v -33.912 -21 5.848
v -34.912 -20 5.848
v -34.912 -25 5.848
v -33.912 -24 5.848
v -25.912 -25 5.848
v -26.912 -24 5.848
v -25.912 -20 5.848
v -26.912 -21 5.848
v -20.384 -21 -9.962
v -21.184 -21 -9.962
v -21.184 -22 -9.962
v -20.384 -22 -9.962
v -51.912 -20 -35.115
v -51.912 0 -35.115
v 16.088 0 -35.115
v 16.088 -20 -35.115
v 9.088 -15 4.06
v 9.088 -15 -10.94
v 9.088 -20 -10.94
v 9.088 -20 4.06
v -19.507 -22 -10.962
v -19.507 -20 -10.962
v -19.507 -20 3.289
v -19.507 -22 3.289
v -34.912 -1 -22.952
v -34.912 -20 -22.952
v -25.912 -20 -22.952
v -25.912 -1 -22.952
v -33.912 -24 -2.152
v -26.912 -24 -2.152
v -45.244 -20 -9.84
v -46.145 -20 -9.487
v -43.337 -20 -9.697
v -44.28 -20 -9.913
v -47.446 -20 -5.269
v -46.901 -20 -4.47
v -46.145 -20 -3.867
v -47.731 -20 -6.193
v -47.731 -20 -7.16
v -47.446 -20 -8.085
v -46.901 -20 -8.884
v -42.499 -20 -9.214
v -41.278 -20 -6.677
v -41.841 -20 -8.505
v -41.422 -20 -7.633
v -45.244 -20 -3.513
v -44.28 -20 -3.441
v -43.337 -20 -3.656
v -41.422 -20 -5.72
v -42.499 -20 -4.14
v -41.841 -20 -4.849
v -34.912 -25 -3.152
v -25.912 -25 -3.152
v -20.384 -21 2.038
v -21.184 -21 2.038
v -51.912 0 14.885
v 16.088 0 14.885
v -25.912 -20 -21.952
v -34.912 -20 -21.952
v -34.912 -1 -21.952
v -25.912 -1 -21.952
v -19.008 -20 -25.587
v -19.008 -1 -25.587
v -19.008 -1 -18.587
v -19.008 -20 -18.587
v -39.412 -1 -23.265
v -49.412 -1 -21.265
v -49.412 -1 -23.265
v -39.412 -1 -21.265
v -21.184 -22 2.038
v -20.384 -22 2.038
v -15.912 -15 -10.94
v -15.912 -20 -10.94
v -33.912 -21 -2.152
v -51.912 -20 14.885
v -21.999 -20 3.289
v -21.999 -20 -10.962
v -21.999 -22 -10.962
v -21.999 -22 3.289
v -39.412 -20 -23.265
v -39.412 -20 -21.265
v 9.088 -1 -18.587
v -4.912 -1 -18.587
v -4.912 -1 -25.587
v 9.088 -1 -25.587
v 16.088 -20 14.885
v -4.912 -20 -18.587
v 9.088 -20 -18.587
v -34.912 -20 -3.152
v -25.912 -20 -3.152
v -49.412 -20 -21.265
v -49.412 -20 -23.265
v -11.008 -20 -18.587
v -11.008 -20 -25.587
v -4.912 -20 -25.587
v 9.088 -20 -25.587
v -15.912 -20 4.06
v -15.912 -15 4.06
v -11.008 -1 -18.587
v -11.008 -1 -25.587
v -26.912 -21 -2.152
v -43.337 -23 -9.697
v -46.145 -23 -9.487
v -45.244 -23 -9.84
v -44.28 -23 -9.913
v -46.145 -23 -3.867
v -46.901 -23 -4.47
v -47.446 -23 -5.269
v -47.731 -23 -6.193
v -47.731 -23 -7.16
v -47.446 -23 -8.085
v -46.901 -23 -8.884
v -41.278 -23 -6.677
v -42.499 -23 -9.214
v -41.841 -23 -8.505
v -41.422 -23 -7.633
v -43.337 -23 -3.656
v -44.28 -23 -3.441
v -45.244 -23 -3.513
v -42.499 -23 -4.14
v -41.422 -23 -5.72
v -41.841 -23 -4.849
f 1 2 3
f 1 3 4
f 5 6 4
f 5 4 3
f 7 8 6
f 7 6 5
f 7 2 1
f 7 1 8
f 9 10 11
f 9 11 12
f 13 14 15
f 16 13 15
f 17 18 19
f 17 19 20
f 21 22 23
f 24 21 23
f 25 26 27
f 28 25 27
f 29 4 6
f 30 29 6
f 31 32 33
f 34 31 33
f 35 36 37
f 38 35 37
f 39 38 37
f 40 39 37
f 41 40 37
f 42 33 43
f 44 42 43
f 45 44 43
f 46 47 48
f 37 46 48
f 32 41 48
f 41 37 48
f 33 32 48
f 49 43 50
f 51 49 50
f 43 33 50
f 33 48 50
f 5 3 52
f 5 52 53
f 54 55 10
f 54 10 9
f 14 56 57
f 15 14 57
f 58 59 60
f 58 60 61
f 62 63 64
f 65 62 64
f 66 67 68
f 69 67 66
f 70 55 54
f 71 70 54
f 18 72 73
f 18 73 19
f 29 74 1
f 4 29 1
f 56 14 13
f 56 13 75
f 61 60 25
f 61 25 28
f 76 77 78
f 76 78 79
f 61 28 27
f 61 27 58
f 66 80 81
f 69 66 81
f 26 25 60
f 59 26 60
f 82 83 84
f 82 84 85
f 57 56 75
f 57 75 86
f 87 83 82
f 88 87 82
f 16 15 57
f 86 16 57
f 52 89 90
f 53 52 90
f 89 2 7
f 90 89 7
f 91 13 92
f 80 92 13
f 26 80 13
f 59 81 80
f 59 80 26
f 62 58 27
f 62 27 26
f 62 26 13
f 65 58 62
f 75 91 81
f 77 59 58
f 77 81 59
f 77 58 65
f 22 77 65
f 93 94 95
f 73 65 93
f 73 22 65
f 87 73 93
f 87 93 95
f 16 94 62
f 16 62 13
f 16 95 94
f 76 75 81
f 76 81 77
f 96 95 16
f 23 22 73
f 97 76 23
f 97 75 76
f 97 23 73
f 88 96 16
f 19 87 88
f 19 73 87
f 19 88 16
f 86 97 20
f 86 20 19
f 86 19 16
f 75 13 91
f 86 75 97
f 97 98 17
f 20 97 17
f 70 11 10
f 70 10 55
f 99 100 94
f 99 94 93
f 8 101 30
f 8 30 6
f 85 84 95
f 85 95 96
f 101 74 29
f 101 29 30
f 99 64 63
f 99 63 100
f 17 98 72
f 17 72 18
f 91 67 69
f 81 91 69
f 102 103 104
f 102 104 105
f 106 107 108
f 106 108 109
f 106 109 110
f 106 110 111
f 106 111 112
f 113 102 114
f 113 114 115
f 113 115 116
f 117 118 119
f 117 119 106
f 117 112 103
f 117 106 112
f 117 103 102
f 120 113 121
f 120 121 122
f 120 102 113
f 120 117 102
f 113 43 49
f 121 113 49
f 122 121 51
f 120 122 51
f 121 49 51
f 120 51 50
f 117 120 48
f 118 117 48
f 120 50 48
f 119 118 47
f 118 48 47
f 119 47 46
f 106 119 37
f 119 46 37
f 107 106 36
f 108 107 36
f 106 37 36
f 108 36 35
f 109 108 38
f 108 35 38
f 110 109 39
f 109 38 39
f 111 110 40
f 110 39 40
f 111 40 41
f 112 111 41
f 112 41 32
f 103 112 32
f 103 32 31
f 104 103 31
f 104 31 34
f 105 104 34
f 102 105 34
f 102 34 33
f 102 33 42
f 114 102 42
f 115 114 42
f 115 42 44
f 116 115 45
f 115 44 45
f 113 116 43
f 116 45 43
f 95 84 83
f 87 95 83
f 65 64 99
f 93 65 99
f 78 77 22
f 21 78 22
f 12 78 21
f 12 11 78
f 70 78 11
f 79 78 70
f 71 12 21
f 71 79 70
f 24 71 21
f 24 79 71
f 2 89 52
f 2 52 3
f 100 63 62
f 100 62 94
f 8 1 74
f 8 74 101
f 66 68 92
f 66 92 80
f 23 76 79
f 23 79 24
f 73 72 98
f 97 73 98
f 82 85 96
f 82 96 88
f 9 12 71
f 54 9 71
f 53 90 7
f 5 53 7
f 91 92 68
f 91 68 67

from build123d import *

# Parameters (mm, degrees)
F0_W      = 15
F0_H      = 50
F1_DEPTH  = 20
F0_W_2    = 13
F2_DEPTH  = 20
F0_W_3    = 40
F3_DEPTH  = 20
F4_W      = 10
F4_H      = 2
F5_DEPTH  = 25
F6_W      = 9
F6_H      = 1
F7_DEPTH  = 25
F8_W      = 14
F8_H      = 7
F8_W_2    = 8
F9_DEPTH  = 25
F11_W     = 25
F11_H     = 15
F12_DEPTH = 25
F13_W     = 64.1647251323
F13_H     = 12.2270062566
F14_DEPTH = 1
F16_W     = 9
F16_H     = 9
F17_DEPTH = 5
F18_T     = -1
F19_R     = 3.2447716186
F20_DEPTH = 3
F21_W     = 2.4915598333
F21_H     = 14.2517206259
F22_DEPTH = 2
F23_W     = 0.8
F23_H     = 12
F24_DEPTH = 1


with BuildPart() as f1:
    # F0 (on Front) → F1 (new body)
    with BuildSketch(Plane.XZ):
        with Locations((-44.4124493003, -10.1152159274)):
            Rectangle(F0_W, F0_H)
    extrude(amount=F1_DEPTH)

    # F4 (on Front) → F5 (cut)
    with BuildSketch(Plane.XZ):
        with Locations((-44.4124493003, -22.2645440847)):
            Rectangle(F4_W, F4_H)
    extrude(amount=F5_DEPTH, mode=Mode.SUBTRACT)


with BuildPart() as f2:
    # F0 (on Front) → F2 (new body)
    with BuildSketch(Plane.XZ):
        with Locations((-30.4124493003, -10.1152159274)):
            Rectangle(F0_W_2, F0_H)
    extrude(amount=F2_DEPTH)

    # F6 (on Front) → F7 (cut)
    with BuildSketch(Plane.XZ):
        with Locations((-30.4124493003, -22.451785475)):
            Rectangle(F6_W, F6_H)
    extrude(amount=F7_DEPTH, mode=Mode.SUBTRACT)


with BuildPart() as f3:
    # F0 (on Front) → F3 (new body)
    with BuildSketch(Plane.XZ):
        with Locations((-3.9124493003, -10.1152159274)):
            Rectangle(F0_W_3, F0_H)
    extrude(amount=F3_DEPTH)

    # F8 (on Front) → F9 (cut)
    with BuildSketch(Plane.XZ):
        with Locations((2.0875506997, -22.0866069347)):
            Rectangle(F8_W, F8_H)
        with Locations((-15.0076995641, -22.0866069347)):
            Rectangle(F8_W_2, F8_H)
    extrude(amount=F9_DEPTH, mode=Mode.SUBTRACT)

    # F11 (on offset) → F12 (cut)
    with BuildSketch(Plane.XZ.offset(15)):
        with Locations((-3.4124493003, -3.4400860965)):
            Rectangle(F11_W, F11_H)
    extrude(amount=F12_DEPTH, mode=Mode.SUBTRACT)


with BuildPart() as f14:
    # F13 (on Front) → F14 (new body)
    with BuildSketch(Plane.XZ):
        with Locations((-18.5078284703, -22.568764165)):
            Rectangle(F13_W, F13_H)
    extrude(amount=F14_DEPTH)


with BuildPart() as f2_1:
    add(f2.part)

    # F15: union F3, F1, F14
    add(f3.part)
    add(f1.part)
    add(f14.part)

    # F21 (on face) → F22 (join)
    with BuildSketch(Plane.XZ.offset(20)):
        with Locations((-20.7528267056, -3.8364862558)):
            Rectangle(F21_W, F21_H)
    extrude(amount=F22_DEPTH)

    # F23 (on face) → F24 (cut)
    with BuildSketch(Plane.XZ.offset(22)):
        with Locations((-20.7843538374, -3.9623465687)):
            Rectangle(F23_W, F23_H)
    extrude(amount=-F24_DEPTH, mode=Mode.SUBTRACT)


with BuildPart() as f17:
    # F16 (on face) → F17 (new body)
    with BuildSketch(Plane.XZ.offset(20)):
        with Locations((-30.4124493003, 1.348200215)):
            Rectangle(F16_W, F16_H)
    extrude(amount=F17_DEPTH)

    # F18
    f18_openings = [f17.faces().sort_by_distance(p)[0] for p in [
        (-30.412449, -22.5, 5.8482),
    ]]
    offset(amount=F18_T, openings=f18_openings)


with BuildPart() as f20:
    # F19 (on face) → F20 (new body)
    with BuildSketch(Plane.XZ.offset(20)):
        with Locations((-44.5223040879, -6.6768634133)):
            Circle(F19_R)
    extrude(amount=F20_DEPTH)


solid = Compound([f2_1.part, f17.part, f20.part])
